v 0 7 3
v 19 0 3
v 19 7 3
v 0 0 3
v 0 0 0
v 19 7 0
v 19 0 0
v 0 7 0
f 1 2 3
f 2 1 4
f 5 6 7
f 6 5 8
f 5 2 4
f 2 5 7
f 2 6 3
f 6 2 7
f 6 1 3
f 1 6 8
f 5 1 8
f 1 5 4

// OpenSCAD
// Generated by SolidPython 1.0.1 on 2020-07-29 00:46:56


cube(size = [19, 7, 3]);
/***********************************************
*********      SolidPython code:      **********
************************************************
 
# import packages: SolidPython
from solid import *
from solid.utils import *
from itertools import chain, combinations, permutations


class Resize:

    def __init__(self, scad_file):
        self.scad_file = scad_file
        #self.scad_file = import_scad(scad_file)
        # cone/cylinder param:
        self.r1 = 0
        self.r2 = 0
        self.h = 0
        # rectangular prism param:
        self.w = 0
        self.l = 0
        # ellipse param:
        self.r = 0

    # import OpenScad code (file name corresponds to shape)


    # classify shape + parameters
    def assign(self, param1, param2, param3):
        if self.scad_file == 'cone.scad':
            self.r1 = param1
            self.r2 = param2
            self.h = param3
        elif self.scad_file == 'cylinder.scad':
            self.r1 = param1
            self.r2 = param2
            self.h = param3
        elif self.scad_file == 'rectangularPrism.scad':
            self.h = param1
            self.l = param2
            self.w = param3
        else:
            self.r = param1
            self.h = param2

    # resize parameters
    def iterate(self):
        x = range(3, 20, 2)
        i = 1
        if self.scad_file == 'cone.scad':
            tempList = list(permutations(x, 2))
            for temp in tempList:
                param1 = temp[0]
                param2 = temp[1]
                filepath = 'produced_scad_files/' + 'cone' + str(param1) + '_' + str(param2) + '_' + '.scad'
                scad_render_to_file(cylinder(h=param1, r1=param2, r2=0), filepath)

        elif self.scad_file == 'cylinder.scad':
            tempList = list(permutations(x, 3))
            for temp in tempList:
                param1 = temp[0]
                param2 = temp[1]
                filepath = 'produced_scad_files/' + 'cylinder' + str(param1) + '_' + str(param2) + '_' + '.scad'
                scad_render_to_file(cylinder(h=param1, r1=param2, r2=param2), filepath)

        elif self.scad_file == 'rectangularPrism.scad':
            tempList = list(permutations(x, 3))
            for temp in tempList:
                param1 = temp[0]
                param2 = temp[1]
                param3 = temp[2]
                filepath = 'produced_scad_files/' + 'rectangularPrism' + str(param1) + '_' + str(param2) + '_' + str(
                    param3) + '.scad'
                scad_render_to_file(cube(size=(param1, param2, param3)), filepath)

        elif self.scad_file == 'ellipse.scad':
            tempList = list(permutations(x, 4))
            for temp in tempList:
                param1 = temp[0]
                param2 = temp[1]
                param3 = temp[2]
                param4 = temp[3]
                filepath = 'produced_scad_files/' + 'ellipse' + str(param1) + '_' + str(param2) + '_' + str(param3) + '_' + str(param4) + '.scad'
                scad_render_to_file(scale([param1, param2, param3])(sphere(r=param4)), filepath)

    def render_to_scadfile(self):
        scad_render_to_file(scad, 'example.scad') 
 
************************************************/
